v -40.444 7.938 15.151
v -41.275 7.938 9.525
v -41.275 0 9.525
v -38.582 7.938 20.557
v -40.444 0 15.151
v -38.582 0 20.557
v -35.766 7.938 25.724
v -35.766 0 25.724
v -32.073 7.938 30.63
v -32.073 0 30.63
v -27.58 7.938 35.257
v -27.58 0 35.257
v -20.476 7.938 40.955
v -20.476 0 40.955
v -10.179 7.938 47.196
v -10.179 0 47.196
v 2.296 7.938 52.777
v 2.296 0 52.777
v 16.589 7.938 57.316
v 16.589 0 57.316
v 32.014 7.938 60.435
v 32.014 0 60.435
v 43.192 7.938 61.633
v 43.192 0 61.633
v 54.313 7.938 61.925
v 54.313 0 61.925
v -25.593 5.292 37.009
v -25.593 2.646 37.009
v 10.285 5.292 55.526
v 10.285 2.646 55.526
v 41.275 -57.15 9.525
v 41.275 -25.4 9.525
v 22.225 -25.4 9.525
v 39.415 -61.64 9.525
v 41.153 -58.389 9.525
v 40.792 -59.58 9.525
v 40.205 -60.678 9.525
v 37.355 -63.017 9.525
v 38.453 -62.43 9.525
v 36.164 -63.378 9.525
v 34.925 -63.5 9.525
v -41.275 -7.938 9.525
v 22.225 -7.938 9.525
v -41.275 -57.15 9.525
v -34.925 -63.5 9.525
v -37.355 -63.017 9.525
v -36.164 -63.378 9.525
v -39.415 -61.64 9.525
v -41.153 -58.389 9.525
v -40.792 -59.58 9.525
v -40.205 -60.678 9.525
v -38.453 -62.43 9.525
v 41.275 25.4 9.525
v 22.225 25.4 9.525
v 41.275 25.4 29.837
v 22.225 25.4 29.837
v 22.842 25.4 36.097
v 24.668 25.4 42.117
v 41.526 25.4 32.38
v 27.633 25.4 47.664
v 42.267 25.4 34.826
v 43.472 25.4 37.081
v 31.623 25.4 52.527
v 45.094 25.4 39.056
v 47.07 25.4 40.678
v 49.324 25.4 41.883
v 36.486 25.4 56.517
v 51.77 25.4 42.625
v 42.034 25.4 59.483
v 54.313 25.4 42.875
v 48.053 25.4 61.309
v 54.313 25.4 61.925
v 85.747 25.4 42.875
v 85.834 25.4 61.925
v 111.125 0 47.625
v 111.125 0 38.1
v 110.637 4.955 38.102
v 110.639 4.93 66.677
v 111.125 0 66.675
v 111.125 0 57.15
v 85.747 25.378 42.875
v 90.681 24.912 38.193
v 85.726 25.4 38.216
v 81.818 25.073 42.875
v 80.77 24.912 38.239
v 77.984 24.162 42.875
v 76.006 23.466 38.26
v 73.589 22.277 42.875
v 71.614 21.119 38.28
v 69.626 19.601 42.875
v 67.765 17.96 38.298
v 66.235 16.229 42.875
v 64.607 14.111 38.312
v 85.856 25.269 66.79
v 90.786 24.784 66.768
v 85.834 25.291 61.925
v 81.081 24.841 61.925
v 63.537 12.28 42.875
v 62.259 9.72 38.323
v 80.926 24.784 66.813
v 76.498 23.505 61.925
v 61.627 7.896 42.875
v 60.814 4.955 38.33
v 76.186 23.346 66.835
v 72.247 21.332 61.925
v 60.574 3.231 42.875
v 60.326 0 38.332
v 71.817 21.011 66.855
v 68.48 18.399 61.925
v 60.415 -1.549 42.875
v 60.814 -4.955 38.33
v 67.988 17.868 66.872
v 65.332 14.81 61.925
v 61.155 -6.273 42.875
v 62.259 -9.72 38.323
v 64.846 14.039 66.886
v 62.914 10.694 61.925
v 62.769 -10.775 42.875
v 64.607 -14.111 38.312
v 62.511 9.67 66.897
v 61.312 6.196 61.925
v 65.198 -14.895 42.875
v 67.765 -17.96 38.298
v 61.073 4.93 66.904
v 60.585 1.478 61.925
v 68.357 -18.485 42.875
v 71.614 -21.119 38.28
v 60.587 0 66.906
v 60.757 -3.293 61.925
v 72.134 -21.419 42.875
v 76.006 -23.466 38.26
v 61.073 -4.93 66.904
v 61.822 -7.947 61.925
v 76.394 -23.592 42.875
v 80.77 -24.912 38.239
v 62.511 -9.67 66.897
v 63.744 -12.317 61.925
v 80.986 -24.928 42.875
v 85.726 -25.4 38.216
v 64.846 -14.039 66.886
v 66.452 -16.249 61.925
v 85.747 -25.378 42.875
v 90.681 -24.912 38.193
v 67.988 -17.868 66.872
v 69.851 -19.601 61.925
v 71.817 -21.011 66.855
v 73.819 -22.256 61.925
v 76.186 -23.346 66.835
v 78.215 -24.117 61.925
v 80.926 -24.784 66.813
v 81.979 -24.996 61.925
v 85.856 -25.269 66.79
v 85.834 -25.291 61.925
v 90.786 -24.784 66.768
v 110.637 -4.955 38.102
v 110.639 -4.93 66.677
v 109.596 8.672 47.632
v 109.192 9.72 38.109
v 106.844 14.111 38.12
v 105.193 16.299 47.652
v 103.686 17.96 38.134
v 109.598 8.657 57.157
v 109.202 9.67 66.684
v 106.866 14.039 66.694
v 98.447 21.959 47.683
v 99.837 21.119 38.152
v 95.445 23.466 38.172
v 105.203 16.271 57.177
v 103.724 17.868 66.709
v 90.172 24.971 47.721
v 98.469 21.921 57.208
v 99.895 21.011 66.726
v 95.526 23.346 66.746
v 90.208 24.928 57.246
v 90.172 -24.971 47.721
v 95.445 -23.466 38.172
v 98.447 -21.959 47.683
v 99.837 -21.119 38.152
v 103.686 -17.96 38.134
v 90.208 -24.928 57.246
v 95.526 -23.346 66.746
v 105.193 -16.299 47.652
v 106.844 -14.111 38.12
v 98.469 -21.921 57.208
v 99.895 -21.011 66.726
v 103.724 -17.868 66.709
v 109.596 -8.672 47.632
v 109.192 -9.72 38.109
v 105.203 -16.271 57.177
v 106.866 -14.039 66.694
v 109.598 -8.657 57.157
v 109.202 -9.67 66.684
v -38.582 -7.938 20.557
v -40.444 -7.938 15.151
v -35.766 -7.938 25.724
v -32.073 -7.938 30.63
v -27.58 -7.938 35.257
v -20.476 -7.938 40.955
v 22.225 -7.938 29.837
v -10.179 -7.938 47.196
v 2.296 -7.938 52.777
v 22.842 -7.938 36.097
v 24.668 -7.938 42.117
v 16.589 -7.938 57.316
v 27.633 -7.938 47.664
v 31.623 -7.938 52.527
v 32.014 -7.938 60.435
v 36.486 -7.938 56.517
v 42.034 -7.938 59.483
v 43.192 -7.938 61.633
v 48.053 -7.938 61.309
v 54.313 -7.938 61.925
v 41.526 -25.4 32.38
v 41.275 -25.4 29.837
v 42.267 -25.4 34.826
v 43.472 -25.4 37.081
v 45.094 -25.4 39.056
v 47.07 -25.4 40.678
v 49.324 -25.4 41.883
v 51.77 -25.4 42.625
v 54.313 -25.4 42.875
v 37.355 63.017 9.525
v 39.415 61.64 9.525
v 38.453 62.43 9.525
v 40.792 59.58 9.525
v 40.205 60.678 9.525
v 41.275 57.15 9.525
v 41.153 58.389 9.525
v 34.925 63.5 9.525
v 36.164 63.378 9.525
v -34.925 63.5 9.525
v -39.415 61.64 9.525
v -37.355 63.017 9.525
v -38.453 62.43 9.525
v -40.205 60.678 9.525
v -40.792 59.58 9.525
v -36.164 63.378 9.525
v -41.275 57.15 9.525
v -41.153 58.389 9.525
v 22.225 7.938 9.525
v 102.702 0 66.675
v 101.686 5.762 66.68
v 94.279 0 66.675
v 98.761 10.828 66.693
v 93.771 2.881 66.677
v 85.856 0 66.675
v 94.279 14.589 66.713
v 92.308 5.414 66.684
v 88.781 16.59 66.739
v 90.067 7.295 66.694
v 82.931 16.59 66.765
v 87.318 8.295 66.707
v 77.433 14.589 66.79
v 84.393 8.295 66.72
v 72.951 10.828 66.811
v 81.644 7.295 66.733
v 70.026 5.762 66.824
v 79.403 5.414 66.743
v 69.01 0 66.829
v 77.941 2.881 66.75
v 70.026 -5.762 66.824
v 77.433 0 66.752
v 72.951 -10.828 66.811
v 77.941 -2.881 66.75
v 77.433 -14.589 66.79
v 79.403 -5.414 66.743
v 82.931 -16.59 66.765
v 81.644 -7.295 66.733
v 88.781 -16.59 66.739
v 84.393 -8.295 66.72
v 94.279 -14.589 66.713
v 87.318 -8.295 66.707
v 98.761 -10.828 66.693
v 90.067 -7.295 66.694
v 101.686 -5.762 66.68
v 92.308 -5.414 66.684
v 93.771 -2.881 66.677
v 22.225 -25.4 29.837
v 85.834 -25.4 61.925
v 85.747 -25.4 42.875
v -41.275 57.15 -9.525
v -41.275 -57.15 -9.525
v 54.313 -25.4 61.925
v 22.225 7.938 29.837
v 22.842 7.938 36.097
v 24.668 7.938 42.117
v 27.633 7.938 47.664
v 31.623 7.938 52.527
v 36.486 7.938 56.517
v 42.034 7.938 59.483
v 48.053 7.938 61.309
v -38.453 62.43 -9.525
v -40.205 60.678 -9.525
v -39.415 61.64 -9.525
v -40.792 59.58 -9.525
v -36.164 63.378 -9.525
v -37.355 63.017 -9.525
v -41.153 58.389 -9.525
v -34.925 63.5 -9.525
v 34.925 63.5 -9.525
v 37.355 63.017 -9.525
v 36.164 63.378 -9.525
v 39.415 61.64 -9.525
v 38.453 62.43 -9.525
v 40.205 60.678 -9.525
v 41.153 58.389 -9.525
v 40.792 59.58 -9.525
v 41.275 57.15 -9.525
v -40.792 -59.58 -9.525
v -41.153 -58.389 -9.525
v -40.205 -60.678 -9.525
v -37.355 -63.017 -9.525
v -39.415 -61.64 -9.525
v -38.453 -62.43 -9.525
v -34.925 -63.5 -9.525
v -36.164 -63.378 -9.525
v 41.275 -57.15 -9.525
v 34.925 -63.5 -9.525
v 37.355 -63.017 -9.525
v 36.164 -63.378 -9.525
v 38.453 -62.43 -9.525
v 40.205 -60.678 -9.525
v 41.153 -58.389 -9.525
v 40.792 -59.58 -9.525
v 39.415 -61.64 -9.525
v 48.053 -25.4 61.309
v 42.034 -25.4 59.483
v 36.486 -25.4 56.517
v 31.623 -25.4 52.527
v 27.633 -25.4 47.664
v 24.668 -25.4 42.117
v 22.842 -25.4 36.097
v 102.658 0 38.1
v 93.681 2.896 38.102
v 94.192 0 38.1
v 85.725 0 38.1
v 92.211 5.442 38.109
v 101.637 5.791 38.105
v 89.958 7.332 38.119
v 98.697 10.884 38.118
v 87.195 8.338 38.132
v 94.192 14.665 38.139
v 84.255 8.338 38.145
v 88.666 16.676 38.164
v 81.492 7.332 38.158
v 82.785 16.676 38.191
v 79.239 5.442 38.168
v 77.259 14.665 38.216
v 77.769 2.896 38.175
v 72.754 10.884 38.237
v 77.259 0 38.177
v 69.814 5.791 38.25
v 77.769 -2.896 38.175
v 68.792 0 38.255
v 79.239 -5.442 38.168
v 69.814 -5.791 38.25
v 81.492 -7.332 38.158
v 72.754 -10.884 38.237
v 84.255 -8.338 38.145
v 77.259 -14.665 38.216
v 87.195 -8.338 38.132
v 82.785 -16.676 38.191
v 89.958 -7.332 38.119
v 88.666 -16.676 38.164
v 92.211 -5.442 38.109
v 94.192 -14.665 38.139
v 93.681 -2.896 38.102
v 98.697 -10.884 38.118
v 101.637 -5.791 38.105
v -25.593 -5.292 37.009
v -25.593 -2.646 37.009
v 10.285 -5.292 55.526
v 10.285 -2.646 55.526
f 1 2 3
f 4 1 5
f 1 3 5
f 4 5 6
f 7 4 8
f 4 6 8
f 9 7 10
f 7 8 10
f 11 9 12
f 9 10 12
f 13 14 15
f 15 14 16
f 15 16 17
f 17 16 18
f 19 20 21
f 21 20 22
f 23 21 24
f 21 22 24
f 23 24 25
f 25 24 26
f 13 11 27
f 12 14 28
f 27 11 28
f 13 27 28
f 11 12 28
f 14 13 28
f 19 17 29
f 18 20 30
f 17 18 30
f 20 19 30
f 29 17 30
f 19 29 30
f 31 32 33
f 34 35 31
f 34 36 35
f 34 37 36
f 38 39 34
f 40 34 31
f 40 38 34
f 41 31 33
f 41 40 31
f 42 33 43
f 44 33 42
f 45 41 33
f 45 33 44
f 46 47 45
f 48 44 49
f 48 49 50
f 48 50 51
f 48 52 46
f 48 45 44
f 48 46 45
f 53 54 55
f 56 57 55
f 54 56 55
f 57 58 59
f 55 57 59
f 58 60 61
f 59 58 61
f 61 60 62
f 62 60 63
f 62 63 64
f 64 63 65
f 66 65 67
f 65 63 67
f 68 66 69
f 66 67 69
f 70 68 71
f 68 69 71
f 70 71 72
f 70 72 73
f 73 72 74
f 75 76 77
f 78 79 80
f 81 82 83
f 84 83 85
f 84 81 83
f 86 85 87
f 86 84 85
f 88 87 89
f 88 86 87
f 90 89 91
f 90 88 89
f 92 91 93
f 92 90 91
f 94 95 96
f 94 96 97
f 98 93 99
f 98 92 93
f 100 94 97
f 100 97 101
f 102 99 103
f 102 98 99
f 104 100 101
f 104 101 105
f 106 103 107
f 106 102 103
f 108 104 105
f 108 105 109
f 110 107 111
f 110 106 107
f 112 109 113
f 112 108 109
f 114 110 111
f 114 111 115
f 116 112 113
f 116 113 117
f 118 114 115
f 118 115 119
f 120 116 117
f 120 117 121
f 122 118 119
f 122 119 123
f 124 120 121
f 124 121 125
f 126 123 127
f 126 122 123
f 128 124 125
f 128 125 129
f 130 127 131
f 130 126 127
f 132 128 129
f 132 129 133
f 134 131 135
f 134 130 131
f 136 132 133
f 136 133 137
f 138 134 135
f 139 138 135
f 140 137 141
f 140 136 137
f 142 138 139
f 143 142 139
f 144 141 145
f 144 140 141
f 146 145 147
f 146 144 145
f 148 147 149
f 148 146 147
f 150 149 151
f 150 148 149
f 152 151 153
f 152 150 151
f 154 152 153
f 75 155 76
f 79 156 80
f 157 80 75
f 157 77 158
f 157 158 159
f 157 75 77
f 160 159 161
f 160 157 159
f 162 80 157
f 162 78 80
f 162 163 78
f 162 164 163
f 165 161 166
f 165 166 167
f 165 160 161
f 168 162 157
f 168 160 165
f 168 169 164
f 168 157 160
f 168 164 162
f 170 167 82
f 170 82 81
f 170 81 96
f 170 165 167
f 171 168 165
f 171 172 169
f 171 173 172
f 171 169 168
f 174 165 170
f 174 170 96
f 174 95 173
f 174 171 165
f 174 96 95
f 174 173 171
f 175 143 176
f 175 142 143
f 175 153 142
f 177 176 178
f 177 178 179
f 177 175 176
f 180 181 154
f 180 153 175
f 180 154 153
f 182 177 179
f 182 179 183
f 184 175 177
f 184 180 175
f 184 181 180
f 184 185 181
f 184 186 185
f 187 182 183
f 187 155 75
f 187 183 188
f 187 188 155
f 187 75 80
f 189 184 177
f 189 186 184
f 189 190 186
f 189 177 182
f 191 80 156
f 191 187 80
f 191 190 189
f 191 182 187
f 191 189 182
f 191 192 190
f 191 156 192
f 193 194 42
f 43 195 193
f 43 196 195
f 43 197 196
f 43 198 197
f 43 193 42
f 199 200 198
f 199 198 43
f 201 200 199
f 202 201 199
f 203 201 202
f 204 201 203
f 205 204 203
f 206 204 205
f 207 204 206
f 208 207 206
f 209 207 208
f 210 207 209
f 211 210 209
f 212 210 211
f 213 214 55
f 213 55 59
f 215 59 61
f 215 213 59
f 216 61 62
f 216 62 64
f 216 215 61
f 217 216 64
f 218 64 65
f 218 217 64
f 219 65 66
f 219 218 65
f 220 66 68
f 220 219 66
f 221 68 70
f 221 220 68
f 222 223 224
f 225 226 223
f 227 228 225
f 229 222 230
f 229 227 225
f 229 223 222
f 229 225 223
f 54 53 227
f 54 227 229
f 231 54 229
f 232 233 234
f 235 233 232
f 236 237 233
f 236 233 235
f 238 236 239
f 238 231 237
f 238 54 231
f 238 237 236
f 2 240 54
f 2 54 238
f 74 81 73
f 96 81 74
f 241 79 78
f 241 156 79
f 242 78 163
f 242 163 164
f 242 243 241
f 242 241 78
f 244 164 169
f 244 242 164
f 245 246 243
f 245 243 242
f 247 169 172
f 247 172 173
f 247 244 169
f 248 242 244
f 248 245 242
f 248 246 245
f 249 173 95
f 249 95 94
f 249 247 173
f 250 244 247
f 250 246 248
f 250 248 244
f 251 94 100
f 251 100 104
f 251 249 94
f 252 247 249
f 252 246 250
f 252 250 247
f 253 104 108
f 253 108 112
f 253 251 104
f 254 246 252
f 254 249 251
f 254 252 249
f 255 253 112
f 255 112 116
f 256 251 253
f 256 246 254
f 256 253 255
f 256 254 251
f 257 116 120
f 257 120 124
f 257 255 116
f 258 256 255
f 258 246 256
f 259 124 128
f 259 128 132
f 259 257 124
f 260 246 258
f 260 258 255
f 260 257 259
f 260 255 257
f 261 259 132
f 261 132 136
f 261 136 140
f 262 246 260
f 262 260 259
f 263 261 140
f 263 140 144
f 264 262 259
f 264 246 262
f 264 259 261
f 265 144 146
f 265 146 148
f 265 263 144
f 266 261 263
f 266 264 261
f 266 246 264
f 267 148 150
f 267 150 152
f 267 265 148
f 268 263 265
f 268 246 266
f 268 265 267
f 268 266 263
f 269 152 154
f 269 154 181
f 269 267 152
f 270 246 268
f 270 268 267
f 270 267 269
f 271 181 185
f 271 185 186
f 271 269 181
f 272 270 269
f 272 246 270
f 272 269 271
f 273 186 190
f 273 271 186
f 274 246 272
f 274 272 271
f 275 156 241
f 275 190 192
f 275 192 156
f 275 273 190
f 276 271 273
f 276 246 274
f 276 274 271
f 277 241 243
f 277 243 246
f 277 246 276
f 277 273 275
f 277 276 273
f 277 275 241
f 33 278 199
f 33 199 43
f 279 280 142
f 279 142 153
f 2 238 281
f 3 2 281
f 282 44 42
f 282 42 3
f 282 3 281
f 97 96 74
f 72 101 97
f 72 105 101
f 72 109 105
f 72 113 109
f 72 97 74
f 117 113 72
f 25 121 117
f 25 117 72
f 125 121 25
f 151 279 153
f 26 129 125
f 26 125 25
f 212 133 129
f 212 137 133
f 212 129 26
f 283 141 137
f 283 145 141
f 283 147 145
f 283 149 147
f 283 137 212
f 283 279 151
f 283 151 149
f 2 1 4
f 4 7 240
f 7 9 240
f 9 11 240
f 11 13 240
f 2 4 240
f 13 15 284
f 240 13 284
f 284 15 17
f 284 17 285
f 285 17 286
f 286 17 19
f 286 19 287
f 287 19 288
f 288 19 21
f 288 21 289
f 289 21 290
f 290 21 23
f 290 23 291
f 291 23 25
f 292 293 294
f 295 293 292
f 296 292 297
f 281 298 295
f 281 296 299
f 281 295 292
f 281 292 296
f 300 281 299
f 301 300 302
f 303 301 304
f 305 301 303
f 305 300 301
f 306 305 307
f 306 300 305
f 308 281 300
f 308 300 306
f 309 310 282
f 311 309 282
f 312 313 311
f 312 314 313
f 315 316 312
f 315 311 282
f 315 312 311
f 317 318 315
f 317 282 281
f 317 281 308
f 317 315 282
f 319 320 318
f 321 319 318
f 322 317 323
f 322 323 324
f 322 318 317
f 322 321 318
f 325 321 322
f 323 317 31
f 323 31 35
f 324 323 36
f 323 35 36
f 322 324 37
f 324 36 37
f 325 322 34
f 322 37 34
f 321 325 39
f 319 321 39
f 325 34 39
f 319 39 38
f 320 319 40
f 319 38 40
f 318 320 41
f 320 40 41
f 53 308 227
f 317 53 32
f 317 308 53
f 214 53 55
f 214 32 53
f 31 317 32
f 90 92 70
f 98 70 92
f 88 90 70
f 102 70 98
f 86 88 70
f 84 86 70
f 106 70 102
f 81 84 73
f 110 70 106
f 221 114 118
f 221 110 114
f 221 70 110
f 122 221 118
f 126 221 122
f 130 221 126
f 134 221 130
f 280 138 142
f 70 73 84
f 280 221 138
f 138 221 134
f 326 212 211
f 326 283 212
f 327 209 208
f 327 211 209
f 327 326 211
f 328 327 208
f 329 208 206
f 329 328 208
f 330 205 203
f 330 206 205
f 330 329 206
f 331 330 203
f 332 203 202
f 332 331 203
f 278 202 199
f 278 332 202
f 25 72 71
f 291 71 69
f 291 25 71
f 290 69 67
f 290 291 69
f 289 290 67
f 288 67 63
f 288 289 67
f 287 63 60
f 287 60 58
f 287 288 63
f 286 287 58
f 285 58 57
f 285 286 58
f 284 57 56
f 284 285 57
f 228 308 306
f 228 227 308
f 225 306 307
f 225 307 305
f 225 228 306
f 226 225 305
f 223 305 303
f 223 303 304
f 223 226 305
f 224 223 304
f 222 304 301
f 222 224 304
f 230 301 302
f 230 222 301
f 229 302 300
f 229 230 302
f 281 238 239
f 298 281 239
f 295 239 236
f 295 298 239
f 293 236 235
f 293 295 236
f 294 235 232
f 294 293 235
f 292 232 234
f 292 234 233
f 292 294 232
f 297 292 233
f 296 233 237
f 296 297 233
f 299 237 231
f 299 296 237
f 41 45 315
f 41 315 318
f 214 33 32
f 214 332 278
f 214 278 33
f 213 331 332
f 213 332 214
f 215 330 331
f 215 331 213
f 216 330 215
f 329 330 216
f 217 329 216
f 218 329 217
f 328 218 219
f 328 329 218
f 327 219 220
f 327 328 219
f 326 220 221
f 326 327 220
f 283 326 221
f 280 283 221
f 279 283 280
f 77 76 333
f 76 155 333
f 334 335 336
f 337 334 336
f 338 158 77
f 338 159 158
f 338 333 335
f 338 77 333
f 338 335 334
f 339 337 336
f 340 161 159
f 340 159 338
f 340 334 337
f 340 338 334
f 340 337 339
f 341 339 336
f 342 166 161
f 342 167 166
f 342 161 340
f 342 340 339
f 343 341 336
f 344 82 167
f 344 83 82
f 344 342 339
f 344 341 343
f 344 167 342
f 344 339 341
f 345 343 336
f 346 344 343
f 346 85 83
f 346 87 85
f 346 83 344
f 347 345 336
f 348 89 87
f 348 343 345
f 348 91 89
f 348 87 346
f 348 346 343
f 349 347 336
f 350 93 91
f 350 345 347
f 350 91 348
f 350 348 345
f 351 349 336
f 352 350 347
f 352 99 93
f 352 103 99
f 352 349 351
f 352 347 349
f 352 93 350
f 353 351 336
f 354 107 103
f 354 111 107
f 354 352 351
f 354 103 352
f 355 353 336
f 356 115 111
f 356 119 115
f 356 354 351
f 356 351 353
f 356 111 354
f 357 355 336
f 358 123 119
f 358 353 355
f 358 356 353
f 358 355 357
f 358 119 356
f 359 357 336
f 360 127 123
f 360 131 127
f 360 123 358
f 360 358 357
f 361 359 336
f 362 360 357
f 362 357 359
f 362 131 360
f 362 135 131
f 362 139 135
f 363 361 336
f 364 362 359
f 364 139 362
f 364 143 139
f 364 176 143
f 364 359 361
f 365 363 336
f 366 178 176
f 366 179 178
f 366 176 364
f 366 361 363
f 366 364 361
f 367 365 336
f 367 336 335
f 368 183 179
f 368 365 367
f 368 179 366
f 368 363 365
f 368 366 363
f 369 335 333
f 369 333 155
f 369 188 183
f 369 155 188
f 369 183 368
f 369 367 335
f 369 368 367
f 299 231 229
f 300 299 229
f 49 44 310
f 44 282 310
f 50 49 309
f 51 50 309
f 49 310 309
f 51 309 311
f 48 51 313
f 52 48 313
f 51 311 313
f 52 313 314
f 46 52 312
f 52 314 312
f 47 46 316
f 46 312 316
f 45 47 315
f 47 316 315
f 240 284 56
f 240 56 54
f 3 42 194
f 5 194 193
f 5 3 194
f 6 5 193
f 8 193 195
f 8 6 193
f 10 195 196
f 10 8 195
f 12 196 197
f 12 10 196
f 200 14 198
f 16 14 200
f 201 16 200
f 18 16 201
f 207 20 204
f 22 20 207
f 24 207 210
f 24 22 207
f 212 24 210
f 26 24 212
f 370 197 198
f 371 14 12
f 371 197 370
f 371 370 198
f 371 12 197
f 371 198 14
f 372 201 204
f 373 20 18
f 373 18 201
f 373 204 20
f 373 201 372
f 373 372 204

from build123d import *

# Parameters (mm, degrees)
F1_DEPTH = 63.5
F2_DEPTH = 25.4
F3_DEPTH = 7.9375
F5_R     = 6.35


with BuildPart() as f1:
    # F0 (on Front) → F1 (new body, symmetric)
    with BuildSketch(Plane.XZ):
        Polygon((41.275, -9.525), (41.275, 9.525), (22.225, 9.525), (-41.275, 9.525), (-41.275, -9.525), align=None)
    extrude(amount=F1_DEPTH, both=True)

    # F0 (on Front) → F2 (join, symmetric)
    with BuildSketch(Plane.XZ):
        with BuildLine():
            Line((22.225, 9.525), (41.275, 9.525))
            Line((41.275, 9.525), (41.275, 29.8368146303))
            ThreePointArc((41.275, 29.8368146303), (45.0938546591, 39.0563453409), (54.3133853697, 42.8752))
            Line((54.3133853697, 42.8752), (60.325, 42.8752))
            Line((60.325, 42.8752), (60.325, 61.9252))
            Line((60.325, 61.9252), (54.3133853697, 61.9252))
            ThreePointArc((54.3133853697, 61.9252), (31.6234704775, 52.5267295225), (22.225, 29.8368146303))
            Line((22.225, 29.8368146303), (22.225, 9.525))
        make_face()
        Polygon((60.325, 61.9252), (60.325, 42.8752), (85.746810308, 42.8752), (85.8338195154, 61.9252), align=None)
    extrude(amount=F2_DEPTH, both=True)

    # F0 (on Front) → F3 (join, symmetric)
    with BuildSketch(Plane.XZ):
        with BuildLine():
            Line((-41.275, 9.525), (22.225, 9.525))
            Line((22.225, 9.525), (22.225, 29.8368146303))
            ThreePointArc((22.225, 29.8368146303), (31.6234704775, 52.5267295225), (54.3133853697, 61.9252))
            add(Edge.make_bspline(
                [(-41.275, 9.525), (-39.7076308727, 40.4430106282), (10.2256173268, 62.635563314), (54.3133853697, 61.9252)],
                knots=[0, 0, 0, 0, 109.0088087157, 109.0088087157, 109.0088087157, 109.0088087157], degree=3))
        make_face()
    extrude(amount=F3_DEPTH, both=True)

    # F0 (on Front) → F4 (revolve)
    with BuildSketch(Plane.XZ):
        Polygon((85.8338195154, 61.9252), (85.746810308, 42.8752), (85.725, 38.1), (111.125, 38.1), (111.125, 66.675), (85.8555138111, 66.675), align=None)
    revolve(axis=Axis((85.7902569056, 0, 52.3875), (0.0045673648, 0, 0.9999895695)))

    # F5
    f5_edges = [f1.edges().sort_by_distance(p)[0] for p in [
        (-41.275, -63.5, 0),
        (41.275, -63.5, 0),
        (41.275, 63.5, 0),
        (-41.275, 63.5, 0),
    ]]
    fillet(f5_edges, radius=F5_R)


solid = f1.part
